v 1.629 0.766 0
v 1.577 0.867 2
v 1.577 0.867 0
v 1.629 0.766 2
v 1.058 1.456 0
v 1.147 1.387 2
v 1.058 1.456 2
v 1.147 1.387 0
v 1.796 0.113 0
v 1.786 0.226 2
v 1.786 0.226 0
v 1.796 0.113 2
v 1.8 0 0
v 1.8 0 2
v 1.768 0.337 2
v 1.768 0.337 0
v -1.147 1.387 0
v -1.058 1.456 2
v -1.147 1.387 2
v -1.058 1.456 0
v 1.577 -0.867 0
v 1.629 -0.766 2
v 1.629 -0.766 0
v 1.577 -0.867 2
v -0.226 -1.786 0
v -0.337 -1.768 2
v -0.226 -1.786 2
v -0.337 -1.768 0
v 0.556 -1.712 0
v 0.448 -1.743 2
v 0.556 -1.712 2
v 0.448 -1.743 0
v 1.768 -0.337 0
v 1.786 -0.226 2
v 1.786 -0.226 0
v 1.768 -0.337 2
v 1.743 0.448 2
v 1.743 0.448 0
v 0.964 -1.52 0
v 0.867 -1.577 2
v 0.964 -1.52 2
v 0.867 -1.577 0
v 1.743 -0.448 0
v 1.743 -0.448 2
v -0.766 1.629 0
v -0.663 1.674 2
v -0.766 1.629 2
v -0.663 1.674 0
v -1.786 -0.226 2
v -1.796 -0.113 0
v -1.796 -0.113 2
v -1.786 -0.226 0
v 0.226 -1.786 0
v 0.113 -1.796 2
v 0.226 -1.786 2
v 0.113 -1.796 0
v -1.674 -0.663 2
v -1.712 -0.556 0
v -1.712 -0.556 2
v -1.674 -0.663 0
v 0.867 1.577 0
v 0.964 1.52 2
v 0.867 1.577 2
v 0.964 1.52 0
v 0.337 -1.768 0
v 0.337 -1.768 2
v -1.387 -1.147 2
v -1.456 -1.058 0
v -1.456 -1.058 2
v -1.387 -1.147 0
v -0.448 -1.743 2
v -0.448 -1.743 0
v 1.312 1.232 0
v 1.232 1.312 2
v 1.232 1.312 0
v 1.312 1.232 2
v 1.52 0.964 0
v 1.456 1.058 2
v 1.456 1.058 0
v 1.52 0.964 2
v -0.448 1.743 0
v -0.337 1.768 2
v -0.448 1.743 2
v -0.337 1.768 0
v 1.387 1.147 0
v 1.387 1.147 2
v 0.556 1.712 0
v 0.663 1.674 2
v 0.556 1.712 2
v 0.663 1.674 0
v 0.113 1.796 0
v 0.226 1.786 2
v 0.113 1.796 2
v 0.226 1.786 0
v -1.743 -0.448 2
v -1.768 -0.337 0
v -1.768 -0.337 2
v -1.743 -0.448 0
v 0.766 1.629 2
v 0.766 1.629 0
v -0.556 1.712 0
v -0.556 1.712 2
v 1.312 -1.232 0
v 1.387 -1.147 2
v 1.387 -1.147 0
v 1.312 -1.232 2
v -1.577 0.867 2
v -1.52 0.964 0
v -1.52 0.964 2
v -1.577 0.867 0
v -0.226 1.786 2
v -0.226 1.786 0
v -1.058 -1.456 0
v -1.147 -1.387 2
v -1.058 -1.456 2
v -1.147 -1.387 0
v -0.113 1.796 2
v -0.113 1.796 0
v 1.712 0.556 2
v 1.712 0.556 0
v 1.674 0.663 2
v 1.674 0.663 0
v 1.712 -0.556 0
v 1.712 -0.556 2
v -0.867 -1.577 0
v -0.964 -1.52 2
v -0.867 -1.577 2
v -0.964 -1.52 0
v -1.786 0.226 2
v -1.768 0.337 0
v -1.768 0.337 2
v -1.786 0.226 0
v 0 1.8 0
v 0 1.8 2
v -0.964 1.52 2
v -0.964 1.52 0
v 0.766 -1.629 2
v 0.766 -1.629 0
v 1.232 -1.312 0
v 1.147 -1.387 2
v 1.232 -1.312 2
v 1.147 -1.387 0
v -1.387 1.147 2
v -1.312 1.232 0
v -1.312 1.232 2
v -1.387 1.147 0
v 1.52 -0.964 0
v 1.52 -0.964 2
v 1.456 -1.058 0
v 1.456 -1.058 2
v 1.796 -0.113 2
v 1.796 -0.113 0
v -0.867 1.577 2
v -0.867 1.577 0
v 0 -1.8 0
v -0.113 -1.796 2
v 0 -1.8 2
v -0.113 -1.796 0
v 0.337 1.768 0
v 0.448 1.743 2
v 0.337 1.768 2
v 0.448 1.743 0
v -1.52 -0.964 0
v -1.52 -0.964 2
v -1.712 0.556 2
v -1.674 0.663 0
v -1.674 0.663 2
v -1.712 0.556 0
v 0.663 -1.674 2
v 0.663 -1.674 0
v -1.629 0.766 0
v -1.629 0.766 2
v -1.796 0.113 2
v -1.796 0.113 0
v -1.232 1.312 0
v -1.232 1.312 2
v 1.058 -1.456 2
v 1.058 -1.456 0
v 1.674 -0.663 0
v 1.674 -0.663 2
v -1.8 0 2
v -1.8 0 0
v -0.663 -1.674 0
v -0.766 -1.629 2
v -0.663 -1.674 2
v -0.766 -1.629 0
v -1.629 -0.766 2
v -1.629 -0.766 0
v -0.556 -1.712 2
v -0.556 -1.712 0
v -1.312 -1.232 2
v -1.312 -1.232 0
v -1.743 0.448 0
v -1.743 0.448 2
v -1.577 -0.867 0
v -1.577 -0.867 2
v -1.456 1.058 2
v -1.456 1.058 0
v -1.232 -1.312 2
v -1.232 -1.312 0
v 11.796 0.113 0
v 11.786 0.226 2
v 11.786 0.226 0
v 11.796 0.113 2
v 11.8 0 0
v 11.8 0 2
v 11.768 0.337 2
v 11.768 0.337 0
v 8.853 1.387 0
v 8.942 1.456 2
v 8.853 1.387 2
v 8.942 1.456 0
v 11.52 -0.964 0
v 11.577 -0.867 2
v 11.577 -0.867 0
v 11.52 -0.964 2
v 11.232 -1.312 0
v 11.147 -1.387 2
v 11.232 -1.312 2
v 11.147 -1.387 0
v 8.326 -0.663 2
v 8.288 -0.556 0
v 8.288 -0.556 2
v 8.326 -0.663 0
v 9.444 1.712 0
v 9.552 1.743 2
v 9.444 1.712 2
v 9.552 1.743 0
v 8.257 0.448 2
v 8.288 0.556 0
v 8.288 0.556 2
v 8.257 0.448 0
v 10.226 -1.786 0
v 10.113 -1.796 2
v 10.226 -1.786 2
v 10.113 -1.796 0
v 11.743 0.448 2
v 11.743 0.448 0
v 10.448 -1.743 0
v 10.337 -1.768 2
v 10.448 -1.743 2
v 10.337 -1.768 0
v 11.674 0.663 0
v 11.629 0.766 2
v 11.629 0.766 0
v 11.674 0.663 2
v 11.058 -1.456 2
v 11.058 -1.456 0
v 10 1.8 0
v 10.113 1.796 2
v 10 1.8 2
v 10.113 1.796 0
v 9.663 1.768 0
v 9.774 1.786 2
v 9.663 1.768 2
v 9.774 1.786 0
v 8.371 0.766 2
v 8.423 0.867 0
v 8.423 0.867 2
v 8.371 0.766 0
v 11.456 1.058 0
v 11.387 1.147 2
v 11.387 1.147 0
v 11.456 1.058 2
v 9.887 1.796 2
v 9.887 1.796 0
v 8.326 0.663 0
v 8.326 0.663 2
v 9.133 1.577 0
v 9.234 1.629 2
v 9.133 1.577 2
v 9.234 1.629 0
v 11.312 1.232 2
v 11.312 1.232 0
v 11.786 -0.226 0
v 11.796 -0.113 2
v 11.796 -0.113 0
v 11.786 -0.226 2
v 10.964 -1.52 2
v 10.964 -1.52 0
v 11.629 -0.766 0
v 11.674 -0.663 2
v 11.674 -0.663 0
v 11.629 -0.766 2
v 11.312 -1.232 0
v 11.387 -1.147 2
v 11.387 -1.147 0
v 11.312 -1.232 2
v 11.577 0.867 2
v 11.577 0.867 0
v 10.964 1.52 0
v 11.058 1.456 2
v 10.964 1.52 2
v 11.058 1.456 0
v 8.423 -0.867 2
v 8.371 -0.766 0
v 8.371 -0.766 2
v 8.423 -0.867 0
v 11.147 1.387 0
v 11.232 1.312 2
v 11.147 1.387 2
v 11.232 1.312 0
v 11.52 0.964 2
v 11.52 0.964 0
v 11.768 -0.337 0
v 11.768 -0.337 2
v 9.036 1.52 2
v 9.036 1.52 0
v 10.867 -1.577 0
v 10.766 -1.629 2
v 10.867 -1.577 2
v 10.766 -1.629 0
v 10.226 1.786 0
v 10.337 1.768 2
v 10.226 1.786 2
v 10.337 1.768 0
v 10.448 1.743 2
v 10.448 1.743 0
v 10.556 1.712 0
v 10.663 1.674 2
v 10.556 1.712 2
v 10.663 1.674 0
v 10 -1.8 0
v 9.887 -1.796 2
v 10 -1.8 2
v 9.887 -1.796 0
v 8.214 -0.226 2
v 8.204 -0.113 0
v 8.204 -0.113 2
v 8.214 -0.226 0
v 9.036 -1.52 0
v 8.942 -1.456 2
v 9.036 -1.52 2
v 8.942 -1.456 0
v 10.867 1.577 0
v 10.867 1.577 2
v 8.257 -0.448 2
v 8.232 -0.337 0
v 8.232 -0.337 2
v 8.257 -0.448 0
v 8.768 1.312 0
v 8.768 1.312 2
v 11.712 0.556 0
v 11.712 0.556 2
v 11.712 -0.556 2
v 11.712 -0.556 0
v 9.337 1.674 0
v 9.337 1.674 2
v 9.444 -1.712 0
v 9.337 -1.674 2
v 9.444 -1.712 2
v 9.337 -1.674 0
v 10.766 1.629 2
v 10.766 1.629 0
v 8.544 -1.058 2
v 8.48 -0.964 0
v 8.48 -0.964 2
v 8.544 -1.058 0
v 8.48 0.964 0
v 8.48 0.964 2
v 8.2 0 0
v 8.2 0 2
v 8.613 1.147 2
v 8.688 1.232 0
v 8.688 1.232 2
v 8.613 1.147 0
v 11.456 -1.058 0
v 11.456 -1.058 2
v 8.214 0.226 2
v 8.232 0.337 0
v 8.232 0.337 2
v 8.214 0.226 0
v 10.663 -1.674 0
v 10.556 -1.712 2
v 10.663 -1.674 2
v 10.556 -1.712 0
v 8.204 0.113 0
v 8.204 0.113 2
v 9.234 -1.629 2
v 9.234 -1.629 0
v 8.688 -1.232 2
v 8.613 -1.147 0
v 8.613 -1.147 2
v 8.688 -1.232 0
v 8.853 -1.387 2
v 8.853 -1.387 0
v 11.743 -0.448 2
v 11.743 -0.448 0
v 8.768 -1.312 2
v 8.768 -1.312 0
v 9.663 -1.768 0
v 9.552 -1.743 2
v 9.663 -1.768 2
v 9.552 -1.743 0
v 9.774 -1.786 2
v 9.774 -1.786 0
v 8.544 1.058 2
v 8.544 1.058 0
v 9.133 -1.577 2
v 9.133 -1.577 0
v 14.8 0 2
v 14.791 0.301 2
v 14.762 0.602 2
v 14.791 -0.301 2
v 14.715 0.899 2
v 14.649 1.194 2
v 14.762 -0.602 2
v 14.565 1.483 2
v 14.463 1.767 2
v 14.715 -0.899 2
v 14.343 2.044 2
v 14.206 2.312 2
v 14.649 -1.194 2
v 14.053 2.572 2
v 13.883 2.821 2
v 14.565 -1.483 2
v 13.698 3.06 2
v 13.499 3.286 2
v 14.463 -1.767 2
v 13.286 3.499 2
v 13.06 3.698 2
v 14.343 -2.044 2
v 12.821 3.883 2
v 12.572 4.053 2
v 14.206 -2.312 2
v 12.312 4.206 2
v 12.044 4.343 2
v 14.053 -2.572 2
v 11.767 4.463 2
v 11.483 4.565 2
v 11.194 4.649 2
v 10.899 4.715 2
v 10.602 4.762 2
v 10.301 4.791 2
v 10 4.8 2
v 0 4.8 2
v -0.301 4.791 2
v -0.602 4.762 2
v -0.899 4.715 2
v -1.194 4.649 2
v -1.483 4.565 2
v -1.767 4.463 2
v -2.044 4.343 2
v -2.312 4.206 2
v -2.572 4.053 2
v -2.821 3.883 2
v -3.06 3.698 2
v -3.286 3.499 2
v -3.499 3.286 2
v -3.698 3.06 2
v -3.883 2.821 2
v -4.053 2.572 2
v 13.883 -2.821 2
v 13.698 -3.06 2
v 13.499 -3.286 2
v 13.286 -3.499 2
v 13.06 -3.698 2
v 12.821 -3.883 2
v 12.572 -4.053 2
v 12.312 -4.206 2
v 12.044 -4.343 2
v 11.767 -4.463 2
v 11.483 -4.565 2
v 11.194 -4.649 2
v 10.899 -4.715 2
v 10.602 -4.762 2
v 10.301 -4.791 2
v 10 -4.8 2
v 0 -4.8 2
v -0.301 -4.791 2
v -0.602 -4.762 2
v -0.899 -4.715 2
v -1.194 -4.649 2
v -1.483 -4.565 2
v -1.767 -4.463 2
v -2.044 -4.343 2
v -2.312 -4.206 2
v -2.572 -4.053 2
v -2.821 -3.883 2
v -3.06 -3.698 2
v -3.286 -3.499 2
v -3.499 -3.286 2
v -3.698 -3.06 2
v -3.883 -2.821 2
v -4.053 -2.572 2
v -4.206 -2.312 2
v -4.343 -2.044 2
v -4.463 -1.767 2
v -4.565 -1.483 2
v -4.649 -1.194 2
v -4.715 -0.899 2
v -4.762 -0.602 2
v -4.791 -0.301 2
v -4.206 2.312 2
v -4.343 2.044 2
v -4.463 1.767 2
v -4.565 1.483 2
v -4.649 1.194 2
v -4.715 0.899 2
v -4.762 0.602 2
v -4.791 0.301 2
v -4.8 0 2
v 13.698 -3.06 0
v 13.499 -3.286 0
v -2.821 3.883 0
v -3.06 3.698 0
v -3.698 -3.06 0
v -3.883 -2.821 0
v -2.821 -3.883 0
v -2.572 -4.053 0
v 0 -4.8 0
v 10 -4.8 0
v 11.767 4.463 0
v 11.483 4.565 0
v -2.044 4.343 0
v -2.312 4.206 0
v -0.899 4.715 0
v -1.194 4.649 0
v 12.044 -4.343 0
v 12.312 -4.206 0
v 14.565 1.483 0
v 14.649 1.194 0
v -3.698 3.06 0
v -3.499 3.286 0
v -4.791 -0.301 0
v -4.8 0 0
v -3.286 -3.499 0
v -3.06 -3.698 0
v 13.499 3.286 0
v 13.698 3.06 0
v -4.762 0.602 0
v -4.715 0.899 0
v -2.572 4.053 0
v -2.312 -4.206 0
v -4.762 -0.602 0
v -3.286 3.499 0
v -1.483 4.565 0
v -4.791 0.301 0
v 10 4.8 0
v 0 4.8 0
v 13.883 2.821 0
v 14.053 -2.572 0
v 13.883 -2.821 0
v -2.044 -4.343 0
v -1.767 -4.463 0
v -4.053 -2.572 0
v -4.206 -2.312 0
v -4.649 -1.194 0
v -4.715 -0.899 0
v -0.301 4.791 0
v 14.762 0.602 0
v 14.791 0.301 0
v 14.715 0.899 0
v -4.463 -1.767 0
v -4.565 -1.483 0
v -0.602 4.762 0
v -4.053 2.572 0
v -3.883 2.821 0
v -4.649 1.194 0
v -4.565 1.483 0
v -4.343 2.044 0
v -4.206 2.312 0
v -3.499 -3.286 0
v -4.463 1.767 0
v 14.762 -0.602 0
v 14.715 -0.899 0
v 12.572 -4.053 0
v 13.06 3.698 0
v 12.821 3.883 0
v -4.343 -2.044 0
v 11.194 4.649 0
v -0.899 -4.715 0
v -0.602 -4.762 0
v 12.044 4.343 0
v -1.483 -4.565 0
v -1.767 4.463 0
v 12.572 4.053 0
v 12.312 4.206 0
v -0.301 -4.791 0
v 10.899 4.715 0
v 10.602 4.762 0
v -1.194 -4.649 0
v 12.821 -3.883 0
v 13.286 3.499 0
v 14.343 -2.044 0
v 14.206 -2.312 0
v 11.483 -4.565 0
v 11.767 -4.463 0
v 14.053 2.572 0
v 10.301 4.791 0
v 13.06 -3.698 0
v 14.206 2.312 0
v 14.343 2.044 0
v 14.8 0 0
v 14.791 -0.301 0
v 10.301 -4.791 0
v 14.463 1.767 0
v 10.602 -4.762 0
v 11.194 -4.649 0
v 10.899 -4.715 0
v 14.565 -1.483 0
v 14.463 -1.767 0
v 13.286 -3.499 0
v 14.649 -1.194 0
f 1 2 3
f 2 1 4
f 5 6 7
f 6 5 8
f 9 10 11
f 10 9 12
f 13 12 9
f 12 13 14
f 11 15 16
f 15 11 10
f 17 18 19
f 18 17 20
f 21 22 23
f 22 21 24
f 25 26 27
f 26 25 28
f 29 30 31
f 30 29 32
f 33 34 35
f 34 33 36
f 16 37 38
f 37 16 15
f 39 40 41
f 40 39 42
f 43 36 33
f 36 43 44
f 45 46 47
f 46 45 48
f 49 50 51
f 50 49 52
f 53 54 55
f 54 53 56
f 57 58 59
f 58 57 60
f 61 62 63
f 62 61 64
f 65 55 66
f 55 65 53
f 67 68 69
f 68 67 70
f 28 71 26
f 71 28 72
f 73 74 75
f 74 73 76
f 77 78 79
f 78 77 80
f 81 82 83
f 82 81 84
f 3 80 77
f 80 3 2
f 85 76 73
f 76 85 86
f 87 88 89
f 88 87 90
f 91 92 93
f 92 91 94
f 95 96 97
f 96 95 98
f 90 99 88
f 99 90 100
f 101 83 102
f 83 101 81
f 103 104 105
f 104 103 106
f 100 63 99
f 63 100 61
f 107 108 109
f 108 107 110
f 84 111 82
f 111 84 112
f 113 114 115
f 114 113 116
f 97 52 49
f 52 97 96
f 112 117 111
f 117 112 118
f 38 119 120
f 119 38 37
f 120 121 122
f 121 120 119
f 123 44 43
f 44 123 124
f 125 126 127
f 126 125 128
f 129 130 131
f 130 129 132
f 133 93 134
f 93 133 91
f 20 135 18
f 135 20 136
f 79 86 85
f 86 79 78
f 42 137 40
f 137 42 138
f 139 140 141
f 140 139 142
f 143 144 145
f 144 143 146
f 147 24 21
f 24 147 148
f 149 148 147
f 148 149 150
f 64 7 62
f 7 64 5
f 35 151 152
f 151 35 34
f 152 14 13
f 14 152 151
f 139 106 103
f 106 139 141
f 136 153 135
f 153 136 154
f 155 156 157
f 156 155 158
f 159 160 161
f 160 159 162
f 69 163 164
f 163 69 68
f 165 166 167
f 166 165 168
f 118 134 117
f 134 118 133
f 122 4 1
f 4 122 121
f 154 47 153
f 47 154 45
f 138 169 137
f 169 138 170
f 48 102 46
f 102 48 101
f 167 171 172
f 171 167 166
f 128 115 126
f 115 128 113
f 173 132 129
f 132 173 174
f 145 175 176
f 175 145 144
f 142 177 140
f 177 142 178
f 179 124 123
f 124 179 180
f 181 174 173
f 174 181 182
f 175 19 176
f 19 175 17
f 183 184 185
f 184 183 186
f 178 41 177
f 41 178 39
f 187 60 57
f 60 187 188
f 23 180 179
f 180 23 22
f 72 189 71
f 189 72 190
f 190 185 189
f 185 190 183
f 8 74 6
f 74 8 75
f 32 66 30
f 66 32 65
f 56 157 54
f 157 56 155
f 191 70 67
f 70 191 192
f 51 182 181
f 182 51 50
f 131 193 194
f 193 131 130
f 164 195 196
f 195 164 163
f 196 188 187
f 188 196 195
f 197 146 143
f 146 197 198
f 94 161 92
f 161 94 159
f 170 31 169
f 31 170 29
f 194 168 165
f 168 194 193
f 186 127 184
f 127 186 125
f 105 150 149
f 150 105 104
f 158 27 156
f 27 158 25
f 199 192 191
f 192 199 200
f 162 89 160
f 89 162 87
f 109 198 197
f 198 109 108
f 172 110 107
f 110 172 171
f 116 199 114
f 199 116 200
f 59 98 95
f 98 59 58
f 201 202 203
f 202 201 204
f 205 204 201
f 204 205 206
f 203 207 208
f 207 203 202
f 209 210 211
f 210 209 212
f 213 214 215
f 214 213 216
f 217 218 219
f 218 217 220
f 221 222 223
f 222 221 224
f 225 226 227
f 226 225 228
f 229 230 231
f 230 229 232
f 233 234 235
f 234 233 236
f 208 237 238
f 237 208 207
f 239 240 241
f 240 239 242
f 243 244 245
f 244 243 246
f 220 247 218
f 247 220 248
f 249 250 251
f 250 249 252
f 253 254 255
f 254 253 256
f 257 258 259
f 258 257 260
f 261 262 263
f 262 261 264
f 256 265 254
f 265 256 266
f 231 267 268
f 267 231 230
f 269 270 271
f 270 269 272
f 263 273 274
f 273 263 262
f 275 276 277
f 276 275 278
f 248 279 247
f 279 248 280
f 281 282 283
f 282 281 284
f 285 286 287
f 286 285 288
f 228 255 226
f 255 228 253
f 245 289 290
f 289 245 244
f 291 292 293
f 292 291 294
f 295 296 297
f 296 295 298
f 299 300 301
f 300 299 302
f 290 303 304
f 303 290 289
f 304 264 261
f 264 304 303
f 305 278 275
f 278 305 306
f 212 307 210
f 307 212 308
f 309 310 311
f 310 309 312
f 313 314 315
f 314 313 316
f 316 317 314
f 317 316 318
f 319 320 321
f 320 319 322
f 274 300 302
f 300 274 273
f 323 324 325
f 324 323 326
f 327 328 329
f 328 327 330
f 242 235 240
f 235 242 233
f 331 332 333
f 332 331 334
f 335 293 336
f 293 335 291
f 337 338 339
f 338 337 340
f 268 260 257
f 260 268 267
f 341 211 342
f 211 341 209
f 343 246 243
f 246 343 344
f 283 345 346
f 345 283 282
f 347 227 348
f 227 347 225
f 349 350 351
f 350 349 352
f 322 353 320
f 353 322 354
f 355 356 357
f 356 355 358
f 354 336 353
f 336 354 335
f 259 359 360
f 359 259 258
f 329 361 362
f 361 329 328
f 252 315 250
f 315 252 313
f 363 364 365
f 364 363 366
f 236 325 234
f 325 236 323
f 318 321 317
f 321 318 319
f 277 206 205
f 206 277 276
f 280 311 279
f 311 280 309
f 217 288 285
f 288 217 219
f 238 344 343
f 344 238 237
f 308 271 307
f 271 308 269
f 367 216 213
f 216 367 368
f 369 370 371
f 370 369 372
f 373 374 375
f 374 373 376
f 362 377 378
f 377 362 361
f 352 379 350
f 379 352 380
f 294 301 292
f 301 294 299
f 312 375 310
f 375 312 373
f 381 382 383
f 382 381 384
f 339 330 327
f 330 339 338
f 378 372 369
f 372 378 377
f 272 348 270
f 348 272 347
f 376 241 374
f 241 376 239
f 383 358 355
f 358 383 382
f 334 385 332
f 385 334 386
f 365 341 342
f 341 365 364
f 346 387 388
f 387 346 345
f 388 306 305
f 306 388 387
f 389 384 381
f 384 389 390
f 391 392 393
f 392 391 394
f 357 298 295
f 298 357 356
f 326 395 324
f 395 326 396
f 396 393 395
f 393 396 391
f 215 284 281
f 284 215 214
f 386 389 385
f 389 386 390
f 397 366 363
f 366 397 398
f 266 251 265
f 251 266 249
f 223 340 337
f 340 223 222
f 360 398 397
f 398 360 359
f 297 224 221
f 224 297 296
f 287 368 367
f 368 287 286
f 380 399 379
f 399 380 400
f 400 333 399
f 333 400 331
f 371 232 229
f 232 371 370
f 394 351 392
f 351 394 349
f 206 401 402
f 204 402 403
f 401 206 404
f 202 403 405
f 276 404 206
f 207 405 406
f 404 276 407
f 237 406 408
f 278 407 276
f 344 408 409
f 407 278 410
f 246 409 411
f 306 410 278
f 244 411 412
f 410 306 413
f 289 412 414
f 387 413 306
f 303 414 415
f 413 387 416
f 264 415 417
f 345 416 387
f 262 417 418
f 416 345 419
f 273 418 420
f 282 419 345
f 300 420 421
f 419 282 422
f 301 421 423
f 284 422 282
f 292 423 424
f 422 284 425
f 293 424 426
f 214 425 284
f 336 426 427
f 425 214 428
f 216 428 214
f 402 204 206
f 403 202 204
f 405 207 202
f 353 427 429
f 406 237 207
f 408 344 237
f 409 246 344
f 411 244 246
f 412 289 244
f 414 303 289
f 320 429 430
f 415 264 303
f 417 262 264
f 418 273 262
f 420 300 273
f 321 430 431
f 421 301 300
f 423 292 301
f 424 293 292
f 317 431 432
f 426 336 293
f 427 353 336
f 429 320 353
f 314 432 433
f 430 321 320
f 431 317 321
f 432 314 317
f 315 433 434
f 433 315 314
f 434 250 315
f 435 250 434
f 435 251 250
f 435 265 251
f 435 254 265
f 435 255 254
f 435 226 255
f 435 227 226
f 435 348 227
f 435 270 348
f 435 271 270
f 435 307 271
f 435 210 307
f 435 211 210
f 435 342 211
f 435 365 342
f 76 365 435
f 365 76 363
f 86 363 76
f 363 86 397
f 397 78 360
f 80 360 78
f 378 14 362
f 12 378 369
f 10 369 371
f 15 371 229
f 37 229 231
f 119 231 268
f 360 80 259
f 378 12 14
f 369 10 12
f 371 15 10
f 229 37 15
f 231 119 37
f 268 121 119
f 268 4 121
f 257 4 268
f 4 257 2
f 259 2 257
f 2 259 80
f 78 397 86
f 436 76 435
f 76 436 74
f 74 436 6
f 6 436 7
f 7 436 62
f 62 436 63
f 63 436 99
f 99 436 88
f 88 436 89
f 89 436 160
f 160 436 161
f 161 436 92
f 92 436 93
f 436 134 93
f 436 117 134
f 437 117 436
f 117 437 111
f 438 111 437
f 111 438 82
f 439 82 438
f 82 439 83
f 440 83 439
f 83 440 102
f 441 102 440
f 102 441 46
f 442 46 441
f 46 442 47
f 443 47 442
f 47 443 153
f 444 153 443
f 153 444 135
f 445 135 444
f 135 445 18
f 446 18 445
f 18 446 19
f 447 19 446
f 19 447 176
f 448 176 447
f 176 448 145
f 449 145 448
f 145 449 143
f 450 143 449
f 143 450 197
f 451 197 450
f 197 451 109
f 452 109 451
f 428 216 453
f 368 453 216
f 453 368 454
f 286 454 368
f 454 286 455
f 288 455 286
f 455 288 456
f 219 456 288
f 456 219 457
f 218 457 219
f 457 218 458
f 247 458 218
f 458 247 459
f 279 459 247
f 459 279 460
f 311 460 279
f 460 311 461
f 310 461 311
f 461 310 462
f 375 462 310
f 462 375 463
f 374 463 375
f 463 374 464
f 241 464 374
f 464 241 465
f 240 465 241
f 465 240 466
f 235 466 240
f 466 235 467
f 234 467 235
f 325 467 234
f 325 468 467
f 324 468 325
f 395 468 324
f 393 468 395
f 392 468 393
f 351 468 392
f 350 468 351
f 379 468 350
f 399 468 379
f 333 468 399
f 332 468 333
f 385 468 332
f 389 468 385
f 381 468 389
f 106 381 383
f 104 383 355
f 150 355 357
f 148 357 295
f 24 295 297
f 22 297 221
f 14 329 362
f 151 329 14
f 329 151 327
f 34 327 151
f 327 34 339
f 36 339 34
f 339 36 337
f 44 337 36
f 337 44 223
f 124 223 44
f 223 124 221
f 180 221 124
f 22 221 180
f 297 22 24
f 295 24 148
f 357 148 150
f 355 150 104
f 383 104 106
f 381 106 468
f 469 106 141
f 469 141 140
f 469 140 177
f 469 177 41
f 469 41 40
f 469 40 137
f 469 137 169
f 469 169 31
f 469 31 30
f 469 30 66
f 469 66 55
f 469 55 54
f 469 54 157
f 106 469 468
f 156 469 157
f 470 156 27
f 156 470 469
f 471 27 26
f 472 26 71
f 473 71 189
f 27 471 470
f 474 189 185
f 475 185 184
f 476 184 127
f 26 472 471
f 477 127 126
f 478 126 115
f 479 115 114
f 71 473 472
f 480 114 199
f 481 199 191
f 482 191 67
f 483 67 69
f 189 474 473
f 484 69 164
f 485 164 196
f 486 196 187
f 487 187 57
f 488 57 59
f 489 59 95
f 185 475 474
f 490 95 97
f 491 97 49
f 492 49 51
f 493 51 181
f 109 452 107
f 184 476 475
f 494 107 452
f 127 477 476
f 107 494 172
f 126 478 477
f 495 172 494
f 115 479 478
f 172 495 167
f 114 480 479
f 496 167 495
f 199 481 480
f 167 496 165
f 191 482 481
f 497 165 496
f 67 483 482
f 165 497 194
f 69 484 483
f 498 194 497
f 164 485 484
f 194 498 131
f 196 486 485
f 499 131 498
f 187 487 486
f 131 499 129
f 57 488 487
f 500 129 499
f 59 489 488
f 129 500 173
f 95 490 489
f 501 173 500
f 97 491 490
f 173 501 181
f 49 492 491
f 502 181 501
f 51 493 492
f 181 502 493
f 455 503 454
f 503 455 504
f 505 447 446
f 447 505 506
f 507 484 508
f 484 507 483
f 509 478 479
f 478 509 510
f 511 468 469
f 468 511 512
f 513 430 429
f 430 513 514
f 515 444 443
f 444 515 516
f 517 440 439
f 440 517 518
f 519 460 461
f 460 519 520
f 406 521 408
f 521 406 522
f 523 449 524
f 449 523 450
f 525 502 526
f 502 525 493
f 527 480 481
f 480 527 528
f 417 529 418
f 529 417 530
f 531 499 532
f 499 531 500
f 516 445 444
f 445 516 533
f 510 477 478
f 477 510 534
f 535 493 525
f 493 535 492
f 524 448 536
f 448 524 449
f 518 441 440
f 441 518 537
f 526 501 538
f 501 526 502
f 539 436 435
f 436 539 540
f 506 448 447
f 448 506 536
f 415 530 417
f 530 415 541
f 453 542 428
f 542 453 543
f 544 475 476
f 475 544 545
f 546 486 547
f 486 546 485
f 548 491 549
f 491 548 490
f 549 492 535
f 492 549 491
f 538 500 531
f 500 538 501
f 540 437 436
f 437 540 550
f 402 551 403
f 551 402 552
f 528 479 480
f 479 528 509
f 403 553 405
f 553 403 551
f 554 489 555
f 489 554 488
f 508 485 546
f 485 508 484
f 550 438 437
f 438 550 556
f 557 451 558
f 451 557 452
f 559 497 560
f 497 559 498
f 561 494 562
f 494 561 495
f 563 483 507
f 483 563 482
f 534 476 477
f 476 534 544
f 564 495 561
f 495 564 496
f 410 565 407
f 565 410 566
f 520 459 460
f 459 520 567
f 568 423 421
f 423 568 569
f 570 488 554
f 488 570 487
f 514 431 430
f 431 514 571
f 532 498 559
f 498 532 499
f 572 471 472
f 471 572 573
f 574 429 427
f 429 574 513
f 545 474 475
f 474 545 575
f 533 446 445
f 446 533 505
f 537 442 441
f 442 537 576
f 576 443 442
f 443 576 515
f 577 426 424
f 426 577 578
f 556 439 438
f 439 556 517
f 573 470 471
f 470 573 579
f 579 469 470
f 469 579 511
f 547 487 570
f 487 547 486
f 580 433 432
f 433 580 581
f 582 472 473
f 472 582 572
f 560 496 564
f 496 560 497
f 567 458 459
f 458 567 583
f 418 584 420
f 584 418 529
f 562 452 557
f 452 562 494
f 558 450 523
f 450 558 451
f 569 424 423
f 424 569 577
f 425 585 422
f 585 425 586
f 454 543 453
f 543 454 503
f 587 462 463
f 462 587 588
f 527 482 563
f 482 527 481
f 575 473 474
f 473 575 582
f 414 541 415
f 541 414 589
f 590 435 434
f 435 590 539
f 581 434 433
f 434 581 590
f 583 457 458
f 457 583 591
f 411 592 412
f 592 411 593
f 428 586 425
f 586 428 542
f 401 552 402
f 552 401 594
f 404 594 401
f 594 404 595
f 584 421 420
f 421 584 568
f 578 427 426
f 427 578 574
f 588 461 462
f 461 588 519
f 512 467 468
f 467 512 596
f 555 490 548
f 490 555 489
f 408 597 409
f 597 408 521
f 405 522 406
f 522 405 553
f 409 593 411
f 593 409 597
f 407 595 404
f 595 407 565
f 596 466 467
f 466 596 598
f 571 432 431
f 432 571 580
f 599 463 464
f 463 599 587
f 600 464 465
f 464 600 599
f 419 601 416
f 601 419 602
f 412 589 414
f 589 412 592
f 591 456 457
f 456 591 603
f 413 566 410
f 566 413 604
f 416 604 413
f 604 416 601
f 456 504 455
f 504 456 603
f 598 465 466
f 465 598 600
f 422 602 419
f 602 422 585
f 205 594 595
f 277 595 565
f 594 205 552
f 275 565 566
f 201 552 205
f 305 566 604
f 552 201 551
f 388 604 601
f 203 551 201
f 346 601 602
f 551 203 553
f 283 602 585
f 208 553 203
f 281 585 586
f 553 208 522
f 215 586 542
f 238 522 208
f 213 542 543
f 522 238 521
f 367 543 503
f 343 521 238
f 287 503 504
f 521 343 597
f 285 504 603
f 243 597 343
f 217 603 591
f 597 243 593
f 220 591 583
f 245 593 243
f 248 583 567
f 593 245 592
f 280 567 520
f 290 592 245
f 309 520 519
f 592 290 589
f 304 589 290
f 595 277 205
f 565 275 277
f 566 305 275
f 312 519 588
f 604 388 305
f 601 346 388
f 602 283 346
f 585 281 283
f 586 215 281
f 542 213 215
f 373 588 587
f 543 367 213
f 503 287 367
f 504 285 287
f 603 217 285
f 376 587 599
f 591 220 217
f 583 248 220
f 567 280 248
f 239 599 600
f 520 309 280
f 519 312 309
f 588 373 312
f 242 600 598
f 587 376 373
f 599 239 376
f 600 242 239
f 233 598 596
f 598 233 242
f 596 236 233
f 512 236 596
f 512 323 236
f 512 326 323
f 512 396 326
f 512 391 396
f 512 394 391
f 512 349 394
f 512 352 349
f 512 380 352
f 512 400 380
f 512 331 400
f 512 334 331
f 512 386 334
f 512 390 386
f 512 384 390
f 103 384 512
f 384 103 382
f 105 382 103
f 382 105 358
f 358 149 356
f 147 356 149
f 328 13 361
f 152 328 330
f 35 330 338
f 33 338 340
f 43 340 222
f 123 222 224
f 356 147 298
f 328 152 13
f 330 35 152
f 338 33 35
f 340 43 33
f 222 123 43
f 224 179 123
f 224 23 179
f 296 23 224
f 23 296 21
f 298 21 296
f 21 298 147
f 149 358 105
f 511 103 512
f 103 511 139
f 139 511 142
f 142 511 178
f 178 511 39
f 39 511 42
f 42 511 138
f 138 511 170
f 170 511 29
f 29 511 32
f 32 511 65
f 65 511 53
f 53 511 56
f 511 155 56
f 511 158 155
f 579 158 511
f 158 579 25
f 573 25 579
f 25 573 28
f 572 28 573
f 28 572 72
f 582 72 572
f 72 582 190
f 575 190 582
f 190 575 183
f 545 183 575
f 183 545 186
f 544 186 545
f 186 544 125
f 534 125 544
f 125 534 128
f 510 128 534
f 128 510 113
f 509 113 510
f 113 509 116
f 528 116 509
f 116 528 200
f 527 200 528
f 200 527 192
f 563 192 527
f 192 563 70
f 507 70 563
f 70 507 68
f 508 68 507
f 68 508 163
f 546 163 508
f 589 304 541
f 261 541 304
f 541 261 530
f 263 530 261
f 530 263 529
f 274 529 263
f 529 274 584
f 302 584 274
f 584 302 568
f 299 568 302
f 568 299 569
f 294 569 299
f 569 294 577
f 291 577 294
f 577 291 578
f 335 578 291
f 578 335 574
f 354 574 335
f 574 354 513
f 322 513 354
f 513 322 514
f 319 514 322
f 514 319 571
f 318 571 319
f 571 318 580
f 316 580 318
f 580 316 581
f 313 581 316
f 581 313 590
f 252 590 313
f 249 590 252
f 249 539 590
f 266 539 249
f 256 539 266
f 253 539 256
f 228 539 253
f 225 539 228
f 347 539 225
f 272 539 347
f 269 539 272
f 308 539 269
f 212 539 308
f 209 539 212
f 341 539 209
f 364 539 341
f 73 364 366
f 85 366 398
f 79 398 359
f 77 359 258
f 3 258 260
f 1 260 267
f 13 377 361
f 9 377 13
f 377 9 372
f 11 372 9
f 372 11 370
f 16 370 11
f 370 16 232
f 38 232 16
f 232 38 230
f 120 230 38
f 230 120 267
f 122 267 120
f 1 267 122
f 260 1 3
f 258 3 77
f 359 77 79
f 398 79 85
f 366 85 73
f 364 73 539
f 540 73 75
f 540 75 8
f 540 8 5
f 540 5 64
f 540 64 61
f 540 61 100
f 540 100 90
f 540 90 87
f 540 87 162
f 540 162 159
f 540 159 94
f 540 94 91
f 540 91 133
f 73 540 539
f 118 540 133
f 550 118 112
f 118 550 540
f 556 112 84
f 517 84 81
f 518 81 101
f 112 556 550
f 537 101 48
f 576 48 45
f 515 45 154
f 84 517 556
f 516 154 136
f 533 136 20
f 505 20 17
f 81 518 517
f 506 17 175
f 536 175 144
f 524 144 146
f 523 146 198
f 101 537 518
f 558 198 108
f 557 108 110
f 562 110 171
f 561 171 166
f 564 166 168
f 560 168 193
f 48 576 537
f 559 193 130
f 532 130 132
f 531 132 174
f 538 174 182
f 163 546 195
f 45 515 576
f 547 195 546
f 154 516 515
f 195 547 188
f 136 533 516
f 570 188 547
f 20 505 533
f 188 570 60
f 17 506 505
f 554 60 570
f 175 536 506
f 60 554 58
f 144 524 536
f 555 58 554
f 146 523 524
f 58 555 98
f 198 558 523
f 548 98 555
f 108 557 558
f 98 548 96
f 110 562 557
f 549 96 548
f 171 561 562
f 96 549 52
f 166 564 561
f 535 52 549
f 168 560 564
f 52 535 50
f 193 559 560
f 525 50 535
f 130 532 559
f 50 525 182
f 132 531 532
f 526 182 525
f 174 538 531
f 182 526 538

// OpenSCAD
// file: nuts.scad
// M2
m2_hole_r = (2/2) + 0.3;

//  M3
m3_thread_r = 1.4;
m3_hole_r = 1.8;
m3_head_r = 6.3/2;
m3_csink_r = 5.5/2;

//  M4
m4_thread_r = 1.9;
m4_hole_r = 2.1;
m4_nut_outer_r = 7.7 / 2;
m4_nut_min_r = 6.8 / 2;
m4_csink_r = 7.7/2;
m4_csink_d = 3;

function nut_hexagon(width) =
    // width is the distance between nut faces
    // eg m4_nut_min_r*2
    let (face_len = width / sqrt(3)) // w/tan(30)
    let (F = face_len / 2)
    let (W = width / 2)
    let (outer = sqrt((F * F) + (W * W)))
    [
        [ -F, W ],
        [ F, W ],
        [ outer, 0 ],
        [ F, -W ],
        [ -F, -W ],
        [ -outer, 0 ],
        [ -F, W ],
    ];

//  FIN
// main file
include <nuts.scad>

$fn = 100;

pitch = 10;
hole_r = m3_hole_r;
r = hole_r + 3;
t = 2;
xs = [ 0, pitch ];

difference()
{
    hull()
    {
        for (x = xs)
        {
            translate([ x, 0, 0 ] )
            cylinder(h=t, r=r);
        }
    }
    for (x = xs)
    {
        translate([ x, 0, -0.01 ] )
        cylinder(h=t+0.02, r=hole_r);
    }
}
